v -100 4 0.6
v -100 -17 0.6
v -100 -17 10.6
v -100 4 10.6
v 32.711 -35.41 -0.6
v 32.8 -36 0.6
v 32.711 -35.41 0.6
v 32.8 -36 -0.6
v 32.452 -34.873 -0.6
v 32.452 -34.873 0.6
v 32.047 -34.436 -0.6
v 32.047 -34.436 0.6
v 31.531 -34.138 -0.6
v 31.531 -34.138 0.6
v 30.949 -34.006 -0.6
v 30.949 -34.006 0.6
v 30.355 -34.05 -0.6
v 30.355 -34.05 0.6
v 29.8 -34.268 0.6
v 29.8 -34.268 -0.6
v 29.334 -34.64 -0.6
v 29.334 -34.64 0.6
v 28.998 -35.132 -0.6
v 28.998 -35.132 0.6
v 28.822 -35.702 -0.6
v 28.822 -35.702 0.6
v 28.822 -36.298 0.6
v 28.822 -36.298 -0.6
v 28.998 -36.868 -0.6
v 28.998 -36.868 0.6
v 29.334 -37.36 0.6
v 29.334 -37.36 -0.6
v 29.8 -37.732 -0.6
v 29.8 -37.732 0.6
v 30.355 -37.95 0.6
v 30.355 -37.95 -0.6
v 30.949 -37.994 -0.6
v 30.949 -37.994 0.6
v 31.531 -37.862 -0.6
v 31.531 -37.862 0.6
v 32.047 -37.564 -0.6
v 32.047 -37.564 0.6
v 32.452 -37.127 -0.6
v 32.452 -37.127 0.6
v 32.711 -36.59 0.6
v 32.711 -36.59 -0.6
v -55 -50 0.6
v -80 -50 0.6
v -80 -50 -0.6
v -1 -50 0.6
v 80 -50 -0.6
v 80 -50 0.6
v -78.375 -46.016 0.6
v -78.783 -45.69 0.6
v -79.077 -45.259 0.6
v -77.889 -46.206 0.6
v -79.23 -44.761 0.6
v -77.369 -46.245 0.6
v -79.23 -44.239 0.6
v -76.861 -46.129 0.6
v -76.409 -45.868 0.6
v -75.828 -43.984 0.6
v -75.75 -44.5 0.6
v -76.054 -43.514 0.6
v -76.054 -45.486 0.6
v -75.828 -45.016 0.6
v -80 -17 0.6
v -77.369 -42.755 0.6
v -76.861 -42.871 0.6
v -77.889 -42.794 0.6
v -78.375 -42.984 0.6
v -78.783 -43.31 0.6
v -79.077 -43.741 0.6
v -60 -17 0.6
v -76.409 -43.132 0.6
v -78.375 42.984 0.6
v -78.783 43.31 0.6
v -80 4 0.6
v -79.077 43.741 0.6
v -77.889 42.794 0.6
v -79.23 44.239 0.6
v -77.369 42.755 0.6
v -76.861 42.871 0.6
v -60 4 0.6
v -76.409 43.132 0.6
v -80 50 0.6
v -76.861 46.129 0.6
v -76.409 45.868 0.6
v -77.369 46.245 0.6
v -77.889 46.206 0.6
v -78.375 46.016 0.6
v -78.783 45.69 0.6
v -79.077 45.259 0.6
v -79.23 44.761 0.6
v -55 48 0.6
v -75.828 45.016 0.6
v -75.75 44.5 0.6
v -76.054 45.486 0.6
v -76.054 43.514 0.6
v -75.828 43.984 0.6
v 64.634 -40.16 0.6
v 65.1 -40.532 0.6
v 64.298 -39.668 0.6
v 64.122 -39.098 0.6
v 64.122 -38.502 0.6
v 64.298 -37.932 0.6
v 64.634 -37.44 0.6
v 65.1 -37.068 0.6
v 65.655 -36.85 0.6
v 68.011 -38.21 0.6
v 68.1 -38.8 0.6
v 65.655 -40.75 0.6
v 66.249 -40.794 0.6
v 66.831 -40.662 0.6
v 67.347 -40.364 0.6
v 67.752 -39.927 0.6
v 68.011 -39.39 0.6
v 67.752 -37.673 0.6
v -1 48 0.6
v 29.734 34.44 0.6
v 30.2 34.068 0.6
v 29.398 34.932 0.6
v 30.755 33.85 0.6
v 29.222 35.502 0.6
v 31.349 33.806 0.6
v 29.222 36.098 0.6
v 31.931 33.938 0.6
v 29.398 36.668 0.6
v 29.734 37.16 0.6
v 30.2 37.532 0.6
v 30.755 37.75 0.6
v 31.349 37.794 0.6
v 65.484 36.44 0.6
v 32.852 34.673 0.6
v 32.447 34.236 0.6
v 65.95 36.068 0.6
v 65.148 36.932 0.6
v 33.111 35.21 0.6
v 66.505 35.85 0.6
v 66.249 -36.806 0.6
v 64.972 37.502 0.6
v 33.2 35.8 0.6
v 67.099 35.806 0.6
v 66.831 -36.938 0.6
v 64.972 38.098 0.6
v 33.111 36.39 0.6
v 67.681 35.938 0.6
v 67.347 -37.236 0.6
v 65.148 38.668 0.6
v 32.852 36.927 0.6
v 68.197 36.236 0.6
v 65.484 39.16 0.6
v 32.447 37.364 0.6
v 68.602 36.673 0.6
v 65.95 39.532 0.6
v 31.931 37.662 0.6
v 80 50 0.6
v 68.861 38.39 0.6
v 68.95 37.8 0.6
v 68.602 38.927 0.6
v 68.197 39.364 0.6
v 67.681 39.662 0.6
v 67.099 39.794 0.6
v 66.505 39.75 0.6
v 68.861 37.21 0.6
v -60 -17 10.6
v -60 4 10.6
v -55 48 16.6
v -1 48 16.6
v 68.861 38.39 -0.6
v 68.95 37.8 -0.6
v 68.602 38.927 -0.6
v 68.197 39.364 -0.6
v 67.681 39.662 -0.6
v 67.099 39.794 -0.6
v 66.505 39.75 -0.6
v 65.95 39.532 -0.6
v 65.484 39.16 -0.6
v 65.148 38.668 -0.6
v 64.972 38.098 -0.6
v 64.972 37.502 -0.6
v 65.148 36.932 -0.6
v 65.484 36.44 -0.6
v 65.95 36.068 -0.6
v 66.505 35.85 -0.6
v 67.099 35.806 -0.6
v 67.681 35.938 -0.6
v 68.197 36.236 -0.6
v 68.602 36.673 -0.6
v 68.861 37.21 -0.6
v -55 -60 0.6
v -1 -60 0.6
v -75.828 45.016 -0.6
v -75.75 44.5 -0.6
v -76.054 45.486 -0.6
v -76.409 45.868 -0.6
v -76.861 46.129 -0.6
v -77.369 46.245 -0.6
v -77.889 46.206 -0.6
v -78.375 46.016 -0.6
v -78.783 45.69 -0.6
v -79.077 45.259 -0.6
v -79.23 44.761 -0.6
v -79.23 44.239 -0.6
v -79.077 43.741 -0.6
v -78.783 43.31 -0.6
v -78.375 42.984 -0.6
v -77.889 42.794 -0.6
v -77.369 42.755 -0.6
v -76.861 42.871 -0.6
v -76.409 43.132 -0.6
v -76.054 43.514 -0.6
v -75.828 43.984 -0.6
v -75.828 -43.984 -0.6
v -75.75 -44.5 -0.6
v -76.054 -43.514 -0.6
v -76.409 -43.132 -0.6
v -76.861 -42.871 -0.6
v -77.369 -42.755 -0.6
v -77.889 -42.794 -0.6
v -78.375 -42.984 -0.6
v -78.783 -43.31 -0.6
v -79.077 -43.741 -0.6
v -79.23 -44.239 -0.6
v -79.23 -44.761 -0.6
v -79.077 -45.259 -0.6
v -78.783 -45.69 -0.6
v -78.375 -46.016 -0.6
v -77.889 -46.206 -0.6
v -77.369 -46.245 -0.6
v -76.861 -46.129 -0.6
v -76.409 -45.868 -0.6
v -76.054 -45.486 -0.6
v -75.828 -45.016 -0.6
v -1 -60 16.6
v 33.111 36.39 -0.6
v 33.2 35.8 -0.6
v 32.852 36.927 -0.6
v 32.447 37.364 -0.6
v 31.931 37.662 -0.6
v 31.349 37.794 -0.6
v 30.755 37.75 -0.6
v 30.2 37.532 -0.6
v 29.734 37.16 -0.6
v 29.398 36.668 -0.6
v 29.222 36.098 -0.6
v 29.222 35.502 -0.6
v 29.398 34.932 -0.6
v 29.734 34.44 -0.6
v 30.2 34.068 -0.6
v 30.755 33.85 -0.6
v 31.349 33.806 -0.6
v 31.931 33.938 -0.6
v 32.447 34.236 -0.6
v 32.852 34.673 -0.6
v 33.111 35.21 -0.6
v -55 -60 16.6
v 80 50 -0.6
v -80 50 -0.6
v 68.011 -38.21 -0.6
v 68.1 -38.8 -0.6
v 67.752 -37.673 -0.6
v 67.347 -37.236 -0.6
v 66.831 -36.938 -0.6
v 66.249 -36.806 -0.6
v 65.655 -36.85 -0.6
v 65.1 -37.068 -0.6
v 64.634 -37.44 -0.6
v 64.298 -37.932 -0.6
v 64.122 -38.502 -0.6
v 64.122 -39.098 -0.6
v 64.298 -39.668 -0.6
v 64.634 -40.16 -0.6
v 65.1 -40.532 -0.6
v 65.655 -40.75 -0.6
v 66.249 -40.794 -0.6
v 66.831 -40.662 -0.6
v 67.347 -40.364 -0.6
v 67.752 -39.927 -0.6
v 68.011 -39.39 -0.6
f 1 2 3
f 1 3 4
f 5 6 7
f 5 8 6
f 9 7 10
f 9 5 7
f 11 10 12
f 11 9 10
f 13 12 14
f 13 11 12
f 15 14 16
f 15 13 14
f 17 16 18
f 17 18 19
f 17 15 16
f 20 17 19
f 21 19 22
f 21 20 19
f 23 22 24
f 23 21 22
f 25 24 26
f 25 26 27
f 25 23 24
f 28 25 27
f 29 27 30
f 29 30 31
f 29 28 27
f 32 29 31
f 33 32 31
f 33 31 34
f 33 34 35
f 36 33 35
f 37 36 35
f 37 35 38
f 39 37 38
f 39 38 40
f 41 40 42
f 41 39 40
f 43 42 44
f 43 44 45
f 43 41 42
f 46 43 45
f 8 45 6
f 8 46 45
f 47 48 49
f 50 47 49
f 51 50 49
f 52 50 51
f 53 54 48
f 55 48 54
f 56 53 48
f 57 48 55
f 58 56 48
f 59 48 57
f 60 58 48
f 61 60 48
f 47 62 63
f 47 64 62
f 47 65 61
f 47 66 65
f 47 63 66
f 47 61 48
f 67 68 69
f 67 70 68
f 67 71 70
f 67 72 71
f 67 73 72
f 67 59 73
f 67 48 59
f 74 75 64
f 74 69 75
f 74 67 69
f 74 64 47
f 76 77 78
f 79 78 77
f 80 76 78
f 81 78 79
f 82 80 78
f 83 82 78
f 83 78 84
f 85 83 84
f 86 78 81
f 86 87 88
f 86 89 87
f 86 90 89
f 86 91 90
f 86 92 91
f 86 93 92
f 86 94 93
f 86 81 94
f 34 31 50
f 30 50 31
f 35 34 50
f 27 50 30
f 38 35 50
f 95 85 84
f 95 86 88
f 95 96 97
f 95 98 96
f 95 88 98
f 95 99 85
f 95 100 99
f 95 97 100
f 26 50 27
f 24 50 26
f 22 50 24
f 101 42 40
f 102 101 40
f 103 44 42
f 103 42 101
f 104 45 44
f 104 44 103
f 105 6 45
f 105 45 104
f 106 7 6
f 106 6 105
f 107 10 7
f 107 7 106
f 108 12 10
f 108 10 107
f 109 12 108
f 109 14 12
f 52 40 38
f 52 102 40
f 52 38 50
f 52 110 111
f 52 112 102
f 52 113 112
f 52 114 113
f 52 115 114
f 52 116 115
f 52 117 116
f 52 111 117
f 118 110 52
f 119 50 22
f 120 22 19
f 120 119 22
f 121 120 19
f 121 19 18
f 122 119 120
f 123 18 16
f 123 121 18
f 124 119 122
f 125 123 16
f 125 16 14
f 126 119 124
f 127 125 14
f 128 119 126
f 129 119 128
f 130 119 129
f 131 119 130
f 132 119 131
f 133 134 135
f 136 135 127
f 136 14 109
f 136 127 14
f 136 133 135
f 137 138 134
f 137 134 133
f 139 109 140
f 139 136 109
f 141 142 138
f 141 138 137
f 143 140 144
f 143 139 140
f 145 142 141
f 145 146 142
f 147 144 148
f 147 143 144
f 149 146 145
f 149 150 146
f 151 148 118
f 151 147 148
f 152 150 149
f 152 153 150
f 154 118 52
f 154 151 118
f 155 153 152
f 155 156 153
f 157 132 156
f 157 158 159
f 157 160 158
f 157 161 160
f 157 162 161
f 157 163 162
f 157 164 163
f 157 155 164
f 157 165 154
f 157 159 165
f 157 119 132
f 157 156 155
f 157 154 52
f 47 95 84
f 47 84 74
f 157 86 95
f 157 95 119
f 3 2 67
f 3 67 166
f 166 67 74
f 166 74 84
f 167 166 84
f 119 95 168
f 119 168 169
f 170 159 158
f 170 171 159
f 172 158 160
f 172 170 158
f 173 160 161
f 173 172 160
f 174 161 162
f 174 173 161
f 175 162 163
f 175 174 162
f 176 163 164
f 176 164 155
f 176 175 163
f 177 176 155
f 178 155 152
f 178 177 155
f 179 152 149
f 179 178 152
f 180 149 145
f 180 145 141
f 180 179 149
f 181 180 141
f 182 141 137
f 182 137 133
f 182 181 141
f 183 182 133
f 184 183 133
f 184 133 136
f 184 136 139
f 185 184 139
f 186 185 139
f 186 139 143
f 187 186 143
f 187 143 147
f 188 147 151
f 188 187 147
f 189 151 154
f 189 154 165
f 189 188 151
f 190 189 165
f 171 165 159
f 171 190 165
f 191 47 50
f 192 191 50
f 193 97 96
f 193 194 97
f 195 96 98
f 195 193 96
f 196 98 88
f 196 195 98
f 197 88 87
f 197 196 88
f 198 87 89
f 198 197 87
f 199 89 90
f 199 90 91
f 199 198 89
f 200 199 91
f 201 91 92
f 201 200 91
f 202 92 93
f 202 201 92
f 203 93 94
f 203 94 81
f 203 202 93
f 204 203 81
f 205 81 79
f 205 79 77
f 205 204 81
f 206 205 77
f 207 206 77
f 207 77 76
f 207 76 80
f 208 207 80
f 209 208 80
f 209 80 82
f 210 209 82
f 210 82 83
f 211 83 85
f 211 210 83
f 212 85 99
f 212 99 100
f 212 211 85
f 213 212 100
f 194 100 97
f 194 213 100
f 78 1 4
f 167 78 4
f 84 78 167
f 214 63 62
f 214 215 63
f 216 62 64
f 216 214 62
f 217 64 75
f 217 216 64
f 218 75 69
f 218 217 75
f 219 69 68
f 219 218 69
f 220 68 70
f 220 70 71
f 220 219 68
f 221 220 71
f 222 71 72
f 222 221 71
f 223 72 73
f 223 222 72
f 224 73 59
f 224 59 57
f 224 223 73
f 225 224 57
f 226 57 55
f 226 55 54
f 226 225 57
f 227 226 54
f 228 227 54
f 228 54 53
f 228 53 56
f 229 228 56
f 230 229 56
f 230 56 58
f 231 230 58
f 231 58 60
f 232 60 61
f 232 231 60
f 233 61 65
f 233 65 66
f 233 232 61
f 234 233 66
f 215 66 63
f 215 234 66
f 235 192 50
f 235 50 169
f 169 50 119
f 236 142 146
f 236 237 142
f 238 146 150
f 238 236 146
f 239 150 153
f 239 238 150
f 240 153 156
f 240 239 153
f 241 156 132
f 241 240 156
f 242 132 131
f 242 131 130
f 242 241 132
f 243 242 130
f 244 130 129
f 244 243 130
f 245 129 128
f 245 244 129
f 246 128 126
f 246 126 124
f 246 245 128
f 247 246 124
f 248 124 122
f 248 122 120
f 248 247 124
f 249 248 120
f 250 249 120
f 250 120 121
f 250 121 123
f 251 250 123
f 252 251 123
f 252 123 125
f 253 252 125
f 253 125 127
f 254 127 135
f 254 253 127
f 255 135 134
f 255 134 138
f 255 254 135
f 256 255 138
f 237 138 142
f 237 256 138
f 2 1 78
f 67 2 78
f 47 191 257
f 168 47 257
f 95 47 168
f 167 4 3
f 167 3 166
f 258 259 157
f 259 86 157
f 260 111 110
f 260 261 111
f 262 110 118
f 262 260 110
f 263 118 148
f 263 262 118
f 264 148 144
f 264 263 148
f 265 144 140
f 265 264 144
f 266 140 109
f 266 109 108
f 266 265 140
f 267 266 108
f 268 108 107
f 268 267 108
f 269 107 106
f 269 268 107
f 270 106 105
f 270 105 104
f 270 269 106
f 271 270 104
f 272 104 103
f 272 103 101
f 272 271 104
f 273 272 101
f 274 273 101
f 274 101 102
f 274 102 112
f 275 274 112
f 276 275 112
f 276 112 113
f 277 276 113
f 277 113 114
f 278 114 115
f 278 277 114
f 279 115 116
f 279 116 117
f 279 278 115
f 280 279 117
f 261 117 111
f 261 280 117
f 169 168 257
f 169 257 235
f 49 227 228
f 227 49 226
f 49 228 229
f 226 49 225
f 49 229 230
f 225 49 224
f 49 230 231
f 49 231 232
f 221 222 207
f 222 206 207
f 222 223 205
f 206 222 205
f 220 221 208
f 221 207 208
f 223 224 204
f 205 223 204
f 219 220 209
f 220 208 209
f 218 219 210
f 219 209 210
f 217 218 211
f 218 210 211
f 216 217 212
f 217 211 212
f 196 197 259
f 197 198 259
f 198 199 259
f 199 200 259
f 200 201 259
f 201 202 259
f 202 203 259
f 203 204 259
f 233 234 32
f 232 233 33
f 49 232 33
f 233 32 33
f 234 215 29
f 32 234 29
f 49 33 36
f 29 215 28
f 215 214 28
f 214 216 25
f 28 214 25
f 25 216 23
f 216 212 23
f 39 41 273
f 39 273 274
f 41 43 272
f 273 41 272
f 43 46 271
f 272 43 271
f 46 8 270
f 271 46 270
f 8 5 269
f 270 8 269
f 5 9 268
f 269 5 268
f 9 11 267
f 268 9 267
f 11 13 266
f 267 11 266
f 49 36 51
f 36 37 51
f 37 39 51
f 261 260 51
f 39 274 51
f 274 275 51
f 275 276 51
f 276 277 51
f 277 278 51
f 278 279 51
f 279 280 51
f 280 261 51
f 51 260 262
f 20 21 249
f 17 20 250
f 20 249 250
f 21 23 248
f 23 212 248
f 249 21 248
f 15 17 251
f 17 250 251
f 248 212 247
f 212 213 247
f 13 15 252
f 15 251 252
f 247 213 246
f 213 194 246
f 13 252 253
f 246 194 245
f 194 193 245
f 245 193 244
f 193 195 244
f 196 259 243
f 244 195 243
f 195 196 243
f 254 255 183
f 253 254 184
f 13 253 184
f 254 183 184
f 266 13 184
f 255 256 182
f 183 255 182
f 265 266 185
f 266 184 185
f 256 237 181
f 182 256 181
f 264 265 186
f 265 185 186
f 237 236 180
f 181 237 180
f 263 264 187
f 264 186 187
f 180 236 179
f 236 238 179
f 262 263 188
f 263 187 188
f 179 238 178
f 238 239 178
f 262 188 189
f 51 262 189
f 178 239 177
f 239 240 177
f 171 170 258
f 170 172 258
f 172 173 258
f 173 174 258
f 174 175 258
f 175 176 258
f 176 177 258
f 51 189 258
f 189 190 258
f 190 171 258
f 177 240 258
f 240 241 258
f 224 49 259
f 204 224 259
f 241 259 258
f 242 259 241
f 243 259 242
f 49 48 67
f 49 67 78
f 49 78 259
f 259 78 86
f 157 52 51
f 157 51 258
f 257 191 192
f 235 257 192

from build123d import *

# Parameters (mm, degrees)
F1_W     = 160
F1_H     = 100
F1_R     = 1.75
F1_R_2   = 2
F2_DEPTH = 0.6
F3_W     = 54
F3_H     = 108
F4_DEPTH = 16
F5_W     = 40
F5_H     = 21
F6_DEPTH = 10


with BuildPart() as f2:
    # F1 (on Top) → F2 (new body, symmetric)
    with BuildSketch(Plane.XY):
        Rectangle(F1_W, F1_H)
        with Locations((-77.5, -44.5)):
            Circle(F1_R, mode=Mode.SUBTRACT)
        with Locations((30.8, -36)):
            Circle(F1_R_2, mode=Mode.SUBTRACT)
        with Locations((66.1, -38.8)):
            Circle(F1_R_2, mode=Mode.SUBTRACT)
        with Locations((-77.5, 44.5)):
            Circle(F1_R, mode=Mode.SUBTRACT)
        with Locations((31.2, 35.8)):
            Circle(F1_R_2, mode=Mode.SUBTRACT)
        with Locations((66.95, 37.8)):
            Circle(F1_R_2, mode=Mode.SUBTRACT)
    extrude(amount=F2_DEPTH, both=True)

    # F3 (on face) → F4 (join)
    with BuildSketch(Plane.XY.offset(0.6)):
        with Locations((-28, -6)):
            Rectangle(F3_W, F3_H)
    extrude(amount=F4_DEPTH)

    # F5 (on face) → F6 (join)
    with BuildSketch(Plane.XY.offset(0.6)):
        with Locations((-80, -6.5)):
            Rectangle(F5_W, F5_H)
    extrude(amount=F6_DEPTH)


solid = f2.part
